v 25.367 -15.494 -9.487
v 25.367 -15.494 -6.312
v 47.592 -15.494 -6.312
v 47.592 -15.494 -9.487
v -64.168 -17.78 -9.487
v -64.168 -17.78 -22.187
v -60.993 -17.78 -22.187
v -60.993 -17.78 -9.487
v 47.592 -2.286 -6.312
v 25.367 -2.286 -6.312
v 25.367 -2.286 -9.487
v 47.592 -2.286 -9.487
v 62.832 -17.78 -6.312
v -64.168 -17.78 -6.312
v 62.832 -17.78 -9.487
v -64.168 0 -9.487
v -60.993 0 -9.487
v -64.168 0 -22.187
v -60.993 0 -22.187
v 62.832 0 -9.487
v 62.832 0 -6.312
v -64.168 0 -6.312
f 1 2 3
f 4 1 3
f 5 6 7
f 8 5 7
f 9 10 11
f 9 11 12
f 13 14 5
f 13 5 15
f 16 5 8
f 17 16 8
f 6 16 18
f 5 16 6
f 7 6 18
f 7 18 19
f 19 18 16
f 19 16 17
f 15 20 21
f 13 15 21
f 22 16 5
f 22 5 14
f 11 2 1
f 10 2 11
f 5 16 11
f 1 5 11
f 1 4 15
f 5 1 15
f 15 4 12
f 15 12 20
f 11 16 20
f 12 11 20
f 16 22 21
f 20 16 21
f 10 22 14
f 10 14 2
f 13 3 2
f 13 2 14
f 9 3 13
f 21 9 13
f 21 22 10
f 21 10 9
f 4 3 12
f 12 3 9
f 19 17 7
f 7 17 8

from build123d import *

# Parameters (mm, degrees)
F0_W     = 127
F0_H     = 3.175
F1_DEPTH = 17.78
F2_W     = 22.225
F2_H     = 13.208
F3_DEPTH = 25.4
F4_W     = 3.175
F4_H     = 17.78
F5_DEPTH = 12.7


with BuildPart() as f1:
    # F0 (on Front) → F1 (new body)
    with BuildSketch(Plane.XZ):
        with Locations((-0.668422, -7.899747)):
            Rectangle(F0_W, F0_H)
    extrude(amount=F1_DEPTH)

    # F2 (on face) → F3 (cut)
    with BuildSketch(Plane.XY.offset(-6.312247)):
        with Locations((36.479078, -8.89)):
            Rectangle(F2_W, F2_H)
    extrude(amount=-F3_DEPTH, mode=Mode.SUBTRACT)


with BuildPart() as f5:
    # F4 (on face) → F5 (new body)
    with BuildSketch(Plane(origin=(0, 0, -9.487247), x_dir=(1, 0, 0), z_dir=(0, 0, -1))):
        with Locations((-62.580922, 8.89)):
            Rectangle(F4_W, F4_H)
    extrude(amount=F5_DEPTH)


solid = Compound([f1.part, f5.part])
